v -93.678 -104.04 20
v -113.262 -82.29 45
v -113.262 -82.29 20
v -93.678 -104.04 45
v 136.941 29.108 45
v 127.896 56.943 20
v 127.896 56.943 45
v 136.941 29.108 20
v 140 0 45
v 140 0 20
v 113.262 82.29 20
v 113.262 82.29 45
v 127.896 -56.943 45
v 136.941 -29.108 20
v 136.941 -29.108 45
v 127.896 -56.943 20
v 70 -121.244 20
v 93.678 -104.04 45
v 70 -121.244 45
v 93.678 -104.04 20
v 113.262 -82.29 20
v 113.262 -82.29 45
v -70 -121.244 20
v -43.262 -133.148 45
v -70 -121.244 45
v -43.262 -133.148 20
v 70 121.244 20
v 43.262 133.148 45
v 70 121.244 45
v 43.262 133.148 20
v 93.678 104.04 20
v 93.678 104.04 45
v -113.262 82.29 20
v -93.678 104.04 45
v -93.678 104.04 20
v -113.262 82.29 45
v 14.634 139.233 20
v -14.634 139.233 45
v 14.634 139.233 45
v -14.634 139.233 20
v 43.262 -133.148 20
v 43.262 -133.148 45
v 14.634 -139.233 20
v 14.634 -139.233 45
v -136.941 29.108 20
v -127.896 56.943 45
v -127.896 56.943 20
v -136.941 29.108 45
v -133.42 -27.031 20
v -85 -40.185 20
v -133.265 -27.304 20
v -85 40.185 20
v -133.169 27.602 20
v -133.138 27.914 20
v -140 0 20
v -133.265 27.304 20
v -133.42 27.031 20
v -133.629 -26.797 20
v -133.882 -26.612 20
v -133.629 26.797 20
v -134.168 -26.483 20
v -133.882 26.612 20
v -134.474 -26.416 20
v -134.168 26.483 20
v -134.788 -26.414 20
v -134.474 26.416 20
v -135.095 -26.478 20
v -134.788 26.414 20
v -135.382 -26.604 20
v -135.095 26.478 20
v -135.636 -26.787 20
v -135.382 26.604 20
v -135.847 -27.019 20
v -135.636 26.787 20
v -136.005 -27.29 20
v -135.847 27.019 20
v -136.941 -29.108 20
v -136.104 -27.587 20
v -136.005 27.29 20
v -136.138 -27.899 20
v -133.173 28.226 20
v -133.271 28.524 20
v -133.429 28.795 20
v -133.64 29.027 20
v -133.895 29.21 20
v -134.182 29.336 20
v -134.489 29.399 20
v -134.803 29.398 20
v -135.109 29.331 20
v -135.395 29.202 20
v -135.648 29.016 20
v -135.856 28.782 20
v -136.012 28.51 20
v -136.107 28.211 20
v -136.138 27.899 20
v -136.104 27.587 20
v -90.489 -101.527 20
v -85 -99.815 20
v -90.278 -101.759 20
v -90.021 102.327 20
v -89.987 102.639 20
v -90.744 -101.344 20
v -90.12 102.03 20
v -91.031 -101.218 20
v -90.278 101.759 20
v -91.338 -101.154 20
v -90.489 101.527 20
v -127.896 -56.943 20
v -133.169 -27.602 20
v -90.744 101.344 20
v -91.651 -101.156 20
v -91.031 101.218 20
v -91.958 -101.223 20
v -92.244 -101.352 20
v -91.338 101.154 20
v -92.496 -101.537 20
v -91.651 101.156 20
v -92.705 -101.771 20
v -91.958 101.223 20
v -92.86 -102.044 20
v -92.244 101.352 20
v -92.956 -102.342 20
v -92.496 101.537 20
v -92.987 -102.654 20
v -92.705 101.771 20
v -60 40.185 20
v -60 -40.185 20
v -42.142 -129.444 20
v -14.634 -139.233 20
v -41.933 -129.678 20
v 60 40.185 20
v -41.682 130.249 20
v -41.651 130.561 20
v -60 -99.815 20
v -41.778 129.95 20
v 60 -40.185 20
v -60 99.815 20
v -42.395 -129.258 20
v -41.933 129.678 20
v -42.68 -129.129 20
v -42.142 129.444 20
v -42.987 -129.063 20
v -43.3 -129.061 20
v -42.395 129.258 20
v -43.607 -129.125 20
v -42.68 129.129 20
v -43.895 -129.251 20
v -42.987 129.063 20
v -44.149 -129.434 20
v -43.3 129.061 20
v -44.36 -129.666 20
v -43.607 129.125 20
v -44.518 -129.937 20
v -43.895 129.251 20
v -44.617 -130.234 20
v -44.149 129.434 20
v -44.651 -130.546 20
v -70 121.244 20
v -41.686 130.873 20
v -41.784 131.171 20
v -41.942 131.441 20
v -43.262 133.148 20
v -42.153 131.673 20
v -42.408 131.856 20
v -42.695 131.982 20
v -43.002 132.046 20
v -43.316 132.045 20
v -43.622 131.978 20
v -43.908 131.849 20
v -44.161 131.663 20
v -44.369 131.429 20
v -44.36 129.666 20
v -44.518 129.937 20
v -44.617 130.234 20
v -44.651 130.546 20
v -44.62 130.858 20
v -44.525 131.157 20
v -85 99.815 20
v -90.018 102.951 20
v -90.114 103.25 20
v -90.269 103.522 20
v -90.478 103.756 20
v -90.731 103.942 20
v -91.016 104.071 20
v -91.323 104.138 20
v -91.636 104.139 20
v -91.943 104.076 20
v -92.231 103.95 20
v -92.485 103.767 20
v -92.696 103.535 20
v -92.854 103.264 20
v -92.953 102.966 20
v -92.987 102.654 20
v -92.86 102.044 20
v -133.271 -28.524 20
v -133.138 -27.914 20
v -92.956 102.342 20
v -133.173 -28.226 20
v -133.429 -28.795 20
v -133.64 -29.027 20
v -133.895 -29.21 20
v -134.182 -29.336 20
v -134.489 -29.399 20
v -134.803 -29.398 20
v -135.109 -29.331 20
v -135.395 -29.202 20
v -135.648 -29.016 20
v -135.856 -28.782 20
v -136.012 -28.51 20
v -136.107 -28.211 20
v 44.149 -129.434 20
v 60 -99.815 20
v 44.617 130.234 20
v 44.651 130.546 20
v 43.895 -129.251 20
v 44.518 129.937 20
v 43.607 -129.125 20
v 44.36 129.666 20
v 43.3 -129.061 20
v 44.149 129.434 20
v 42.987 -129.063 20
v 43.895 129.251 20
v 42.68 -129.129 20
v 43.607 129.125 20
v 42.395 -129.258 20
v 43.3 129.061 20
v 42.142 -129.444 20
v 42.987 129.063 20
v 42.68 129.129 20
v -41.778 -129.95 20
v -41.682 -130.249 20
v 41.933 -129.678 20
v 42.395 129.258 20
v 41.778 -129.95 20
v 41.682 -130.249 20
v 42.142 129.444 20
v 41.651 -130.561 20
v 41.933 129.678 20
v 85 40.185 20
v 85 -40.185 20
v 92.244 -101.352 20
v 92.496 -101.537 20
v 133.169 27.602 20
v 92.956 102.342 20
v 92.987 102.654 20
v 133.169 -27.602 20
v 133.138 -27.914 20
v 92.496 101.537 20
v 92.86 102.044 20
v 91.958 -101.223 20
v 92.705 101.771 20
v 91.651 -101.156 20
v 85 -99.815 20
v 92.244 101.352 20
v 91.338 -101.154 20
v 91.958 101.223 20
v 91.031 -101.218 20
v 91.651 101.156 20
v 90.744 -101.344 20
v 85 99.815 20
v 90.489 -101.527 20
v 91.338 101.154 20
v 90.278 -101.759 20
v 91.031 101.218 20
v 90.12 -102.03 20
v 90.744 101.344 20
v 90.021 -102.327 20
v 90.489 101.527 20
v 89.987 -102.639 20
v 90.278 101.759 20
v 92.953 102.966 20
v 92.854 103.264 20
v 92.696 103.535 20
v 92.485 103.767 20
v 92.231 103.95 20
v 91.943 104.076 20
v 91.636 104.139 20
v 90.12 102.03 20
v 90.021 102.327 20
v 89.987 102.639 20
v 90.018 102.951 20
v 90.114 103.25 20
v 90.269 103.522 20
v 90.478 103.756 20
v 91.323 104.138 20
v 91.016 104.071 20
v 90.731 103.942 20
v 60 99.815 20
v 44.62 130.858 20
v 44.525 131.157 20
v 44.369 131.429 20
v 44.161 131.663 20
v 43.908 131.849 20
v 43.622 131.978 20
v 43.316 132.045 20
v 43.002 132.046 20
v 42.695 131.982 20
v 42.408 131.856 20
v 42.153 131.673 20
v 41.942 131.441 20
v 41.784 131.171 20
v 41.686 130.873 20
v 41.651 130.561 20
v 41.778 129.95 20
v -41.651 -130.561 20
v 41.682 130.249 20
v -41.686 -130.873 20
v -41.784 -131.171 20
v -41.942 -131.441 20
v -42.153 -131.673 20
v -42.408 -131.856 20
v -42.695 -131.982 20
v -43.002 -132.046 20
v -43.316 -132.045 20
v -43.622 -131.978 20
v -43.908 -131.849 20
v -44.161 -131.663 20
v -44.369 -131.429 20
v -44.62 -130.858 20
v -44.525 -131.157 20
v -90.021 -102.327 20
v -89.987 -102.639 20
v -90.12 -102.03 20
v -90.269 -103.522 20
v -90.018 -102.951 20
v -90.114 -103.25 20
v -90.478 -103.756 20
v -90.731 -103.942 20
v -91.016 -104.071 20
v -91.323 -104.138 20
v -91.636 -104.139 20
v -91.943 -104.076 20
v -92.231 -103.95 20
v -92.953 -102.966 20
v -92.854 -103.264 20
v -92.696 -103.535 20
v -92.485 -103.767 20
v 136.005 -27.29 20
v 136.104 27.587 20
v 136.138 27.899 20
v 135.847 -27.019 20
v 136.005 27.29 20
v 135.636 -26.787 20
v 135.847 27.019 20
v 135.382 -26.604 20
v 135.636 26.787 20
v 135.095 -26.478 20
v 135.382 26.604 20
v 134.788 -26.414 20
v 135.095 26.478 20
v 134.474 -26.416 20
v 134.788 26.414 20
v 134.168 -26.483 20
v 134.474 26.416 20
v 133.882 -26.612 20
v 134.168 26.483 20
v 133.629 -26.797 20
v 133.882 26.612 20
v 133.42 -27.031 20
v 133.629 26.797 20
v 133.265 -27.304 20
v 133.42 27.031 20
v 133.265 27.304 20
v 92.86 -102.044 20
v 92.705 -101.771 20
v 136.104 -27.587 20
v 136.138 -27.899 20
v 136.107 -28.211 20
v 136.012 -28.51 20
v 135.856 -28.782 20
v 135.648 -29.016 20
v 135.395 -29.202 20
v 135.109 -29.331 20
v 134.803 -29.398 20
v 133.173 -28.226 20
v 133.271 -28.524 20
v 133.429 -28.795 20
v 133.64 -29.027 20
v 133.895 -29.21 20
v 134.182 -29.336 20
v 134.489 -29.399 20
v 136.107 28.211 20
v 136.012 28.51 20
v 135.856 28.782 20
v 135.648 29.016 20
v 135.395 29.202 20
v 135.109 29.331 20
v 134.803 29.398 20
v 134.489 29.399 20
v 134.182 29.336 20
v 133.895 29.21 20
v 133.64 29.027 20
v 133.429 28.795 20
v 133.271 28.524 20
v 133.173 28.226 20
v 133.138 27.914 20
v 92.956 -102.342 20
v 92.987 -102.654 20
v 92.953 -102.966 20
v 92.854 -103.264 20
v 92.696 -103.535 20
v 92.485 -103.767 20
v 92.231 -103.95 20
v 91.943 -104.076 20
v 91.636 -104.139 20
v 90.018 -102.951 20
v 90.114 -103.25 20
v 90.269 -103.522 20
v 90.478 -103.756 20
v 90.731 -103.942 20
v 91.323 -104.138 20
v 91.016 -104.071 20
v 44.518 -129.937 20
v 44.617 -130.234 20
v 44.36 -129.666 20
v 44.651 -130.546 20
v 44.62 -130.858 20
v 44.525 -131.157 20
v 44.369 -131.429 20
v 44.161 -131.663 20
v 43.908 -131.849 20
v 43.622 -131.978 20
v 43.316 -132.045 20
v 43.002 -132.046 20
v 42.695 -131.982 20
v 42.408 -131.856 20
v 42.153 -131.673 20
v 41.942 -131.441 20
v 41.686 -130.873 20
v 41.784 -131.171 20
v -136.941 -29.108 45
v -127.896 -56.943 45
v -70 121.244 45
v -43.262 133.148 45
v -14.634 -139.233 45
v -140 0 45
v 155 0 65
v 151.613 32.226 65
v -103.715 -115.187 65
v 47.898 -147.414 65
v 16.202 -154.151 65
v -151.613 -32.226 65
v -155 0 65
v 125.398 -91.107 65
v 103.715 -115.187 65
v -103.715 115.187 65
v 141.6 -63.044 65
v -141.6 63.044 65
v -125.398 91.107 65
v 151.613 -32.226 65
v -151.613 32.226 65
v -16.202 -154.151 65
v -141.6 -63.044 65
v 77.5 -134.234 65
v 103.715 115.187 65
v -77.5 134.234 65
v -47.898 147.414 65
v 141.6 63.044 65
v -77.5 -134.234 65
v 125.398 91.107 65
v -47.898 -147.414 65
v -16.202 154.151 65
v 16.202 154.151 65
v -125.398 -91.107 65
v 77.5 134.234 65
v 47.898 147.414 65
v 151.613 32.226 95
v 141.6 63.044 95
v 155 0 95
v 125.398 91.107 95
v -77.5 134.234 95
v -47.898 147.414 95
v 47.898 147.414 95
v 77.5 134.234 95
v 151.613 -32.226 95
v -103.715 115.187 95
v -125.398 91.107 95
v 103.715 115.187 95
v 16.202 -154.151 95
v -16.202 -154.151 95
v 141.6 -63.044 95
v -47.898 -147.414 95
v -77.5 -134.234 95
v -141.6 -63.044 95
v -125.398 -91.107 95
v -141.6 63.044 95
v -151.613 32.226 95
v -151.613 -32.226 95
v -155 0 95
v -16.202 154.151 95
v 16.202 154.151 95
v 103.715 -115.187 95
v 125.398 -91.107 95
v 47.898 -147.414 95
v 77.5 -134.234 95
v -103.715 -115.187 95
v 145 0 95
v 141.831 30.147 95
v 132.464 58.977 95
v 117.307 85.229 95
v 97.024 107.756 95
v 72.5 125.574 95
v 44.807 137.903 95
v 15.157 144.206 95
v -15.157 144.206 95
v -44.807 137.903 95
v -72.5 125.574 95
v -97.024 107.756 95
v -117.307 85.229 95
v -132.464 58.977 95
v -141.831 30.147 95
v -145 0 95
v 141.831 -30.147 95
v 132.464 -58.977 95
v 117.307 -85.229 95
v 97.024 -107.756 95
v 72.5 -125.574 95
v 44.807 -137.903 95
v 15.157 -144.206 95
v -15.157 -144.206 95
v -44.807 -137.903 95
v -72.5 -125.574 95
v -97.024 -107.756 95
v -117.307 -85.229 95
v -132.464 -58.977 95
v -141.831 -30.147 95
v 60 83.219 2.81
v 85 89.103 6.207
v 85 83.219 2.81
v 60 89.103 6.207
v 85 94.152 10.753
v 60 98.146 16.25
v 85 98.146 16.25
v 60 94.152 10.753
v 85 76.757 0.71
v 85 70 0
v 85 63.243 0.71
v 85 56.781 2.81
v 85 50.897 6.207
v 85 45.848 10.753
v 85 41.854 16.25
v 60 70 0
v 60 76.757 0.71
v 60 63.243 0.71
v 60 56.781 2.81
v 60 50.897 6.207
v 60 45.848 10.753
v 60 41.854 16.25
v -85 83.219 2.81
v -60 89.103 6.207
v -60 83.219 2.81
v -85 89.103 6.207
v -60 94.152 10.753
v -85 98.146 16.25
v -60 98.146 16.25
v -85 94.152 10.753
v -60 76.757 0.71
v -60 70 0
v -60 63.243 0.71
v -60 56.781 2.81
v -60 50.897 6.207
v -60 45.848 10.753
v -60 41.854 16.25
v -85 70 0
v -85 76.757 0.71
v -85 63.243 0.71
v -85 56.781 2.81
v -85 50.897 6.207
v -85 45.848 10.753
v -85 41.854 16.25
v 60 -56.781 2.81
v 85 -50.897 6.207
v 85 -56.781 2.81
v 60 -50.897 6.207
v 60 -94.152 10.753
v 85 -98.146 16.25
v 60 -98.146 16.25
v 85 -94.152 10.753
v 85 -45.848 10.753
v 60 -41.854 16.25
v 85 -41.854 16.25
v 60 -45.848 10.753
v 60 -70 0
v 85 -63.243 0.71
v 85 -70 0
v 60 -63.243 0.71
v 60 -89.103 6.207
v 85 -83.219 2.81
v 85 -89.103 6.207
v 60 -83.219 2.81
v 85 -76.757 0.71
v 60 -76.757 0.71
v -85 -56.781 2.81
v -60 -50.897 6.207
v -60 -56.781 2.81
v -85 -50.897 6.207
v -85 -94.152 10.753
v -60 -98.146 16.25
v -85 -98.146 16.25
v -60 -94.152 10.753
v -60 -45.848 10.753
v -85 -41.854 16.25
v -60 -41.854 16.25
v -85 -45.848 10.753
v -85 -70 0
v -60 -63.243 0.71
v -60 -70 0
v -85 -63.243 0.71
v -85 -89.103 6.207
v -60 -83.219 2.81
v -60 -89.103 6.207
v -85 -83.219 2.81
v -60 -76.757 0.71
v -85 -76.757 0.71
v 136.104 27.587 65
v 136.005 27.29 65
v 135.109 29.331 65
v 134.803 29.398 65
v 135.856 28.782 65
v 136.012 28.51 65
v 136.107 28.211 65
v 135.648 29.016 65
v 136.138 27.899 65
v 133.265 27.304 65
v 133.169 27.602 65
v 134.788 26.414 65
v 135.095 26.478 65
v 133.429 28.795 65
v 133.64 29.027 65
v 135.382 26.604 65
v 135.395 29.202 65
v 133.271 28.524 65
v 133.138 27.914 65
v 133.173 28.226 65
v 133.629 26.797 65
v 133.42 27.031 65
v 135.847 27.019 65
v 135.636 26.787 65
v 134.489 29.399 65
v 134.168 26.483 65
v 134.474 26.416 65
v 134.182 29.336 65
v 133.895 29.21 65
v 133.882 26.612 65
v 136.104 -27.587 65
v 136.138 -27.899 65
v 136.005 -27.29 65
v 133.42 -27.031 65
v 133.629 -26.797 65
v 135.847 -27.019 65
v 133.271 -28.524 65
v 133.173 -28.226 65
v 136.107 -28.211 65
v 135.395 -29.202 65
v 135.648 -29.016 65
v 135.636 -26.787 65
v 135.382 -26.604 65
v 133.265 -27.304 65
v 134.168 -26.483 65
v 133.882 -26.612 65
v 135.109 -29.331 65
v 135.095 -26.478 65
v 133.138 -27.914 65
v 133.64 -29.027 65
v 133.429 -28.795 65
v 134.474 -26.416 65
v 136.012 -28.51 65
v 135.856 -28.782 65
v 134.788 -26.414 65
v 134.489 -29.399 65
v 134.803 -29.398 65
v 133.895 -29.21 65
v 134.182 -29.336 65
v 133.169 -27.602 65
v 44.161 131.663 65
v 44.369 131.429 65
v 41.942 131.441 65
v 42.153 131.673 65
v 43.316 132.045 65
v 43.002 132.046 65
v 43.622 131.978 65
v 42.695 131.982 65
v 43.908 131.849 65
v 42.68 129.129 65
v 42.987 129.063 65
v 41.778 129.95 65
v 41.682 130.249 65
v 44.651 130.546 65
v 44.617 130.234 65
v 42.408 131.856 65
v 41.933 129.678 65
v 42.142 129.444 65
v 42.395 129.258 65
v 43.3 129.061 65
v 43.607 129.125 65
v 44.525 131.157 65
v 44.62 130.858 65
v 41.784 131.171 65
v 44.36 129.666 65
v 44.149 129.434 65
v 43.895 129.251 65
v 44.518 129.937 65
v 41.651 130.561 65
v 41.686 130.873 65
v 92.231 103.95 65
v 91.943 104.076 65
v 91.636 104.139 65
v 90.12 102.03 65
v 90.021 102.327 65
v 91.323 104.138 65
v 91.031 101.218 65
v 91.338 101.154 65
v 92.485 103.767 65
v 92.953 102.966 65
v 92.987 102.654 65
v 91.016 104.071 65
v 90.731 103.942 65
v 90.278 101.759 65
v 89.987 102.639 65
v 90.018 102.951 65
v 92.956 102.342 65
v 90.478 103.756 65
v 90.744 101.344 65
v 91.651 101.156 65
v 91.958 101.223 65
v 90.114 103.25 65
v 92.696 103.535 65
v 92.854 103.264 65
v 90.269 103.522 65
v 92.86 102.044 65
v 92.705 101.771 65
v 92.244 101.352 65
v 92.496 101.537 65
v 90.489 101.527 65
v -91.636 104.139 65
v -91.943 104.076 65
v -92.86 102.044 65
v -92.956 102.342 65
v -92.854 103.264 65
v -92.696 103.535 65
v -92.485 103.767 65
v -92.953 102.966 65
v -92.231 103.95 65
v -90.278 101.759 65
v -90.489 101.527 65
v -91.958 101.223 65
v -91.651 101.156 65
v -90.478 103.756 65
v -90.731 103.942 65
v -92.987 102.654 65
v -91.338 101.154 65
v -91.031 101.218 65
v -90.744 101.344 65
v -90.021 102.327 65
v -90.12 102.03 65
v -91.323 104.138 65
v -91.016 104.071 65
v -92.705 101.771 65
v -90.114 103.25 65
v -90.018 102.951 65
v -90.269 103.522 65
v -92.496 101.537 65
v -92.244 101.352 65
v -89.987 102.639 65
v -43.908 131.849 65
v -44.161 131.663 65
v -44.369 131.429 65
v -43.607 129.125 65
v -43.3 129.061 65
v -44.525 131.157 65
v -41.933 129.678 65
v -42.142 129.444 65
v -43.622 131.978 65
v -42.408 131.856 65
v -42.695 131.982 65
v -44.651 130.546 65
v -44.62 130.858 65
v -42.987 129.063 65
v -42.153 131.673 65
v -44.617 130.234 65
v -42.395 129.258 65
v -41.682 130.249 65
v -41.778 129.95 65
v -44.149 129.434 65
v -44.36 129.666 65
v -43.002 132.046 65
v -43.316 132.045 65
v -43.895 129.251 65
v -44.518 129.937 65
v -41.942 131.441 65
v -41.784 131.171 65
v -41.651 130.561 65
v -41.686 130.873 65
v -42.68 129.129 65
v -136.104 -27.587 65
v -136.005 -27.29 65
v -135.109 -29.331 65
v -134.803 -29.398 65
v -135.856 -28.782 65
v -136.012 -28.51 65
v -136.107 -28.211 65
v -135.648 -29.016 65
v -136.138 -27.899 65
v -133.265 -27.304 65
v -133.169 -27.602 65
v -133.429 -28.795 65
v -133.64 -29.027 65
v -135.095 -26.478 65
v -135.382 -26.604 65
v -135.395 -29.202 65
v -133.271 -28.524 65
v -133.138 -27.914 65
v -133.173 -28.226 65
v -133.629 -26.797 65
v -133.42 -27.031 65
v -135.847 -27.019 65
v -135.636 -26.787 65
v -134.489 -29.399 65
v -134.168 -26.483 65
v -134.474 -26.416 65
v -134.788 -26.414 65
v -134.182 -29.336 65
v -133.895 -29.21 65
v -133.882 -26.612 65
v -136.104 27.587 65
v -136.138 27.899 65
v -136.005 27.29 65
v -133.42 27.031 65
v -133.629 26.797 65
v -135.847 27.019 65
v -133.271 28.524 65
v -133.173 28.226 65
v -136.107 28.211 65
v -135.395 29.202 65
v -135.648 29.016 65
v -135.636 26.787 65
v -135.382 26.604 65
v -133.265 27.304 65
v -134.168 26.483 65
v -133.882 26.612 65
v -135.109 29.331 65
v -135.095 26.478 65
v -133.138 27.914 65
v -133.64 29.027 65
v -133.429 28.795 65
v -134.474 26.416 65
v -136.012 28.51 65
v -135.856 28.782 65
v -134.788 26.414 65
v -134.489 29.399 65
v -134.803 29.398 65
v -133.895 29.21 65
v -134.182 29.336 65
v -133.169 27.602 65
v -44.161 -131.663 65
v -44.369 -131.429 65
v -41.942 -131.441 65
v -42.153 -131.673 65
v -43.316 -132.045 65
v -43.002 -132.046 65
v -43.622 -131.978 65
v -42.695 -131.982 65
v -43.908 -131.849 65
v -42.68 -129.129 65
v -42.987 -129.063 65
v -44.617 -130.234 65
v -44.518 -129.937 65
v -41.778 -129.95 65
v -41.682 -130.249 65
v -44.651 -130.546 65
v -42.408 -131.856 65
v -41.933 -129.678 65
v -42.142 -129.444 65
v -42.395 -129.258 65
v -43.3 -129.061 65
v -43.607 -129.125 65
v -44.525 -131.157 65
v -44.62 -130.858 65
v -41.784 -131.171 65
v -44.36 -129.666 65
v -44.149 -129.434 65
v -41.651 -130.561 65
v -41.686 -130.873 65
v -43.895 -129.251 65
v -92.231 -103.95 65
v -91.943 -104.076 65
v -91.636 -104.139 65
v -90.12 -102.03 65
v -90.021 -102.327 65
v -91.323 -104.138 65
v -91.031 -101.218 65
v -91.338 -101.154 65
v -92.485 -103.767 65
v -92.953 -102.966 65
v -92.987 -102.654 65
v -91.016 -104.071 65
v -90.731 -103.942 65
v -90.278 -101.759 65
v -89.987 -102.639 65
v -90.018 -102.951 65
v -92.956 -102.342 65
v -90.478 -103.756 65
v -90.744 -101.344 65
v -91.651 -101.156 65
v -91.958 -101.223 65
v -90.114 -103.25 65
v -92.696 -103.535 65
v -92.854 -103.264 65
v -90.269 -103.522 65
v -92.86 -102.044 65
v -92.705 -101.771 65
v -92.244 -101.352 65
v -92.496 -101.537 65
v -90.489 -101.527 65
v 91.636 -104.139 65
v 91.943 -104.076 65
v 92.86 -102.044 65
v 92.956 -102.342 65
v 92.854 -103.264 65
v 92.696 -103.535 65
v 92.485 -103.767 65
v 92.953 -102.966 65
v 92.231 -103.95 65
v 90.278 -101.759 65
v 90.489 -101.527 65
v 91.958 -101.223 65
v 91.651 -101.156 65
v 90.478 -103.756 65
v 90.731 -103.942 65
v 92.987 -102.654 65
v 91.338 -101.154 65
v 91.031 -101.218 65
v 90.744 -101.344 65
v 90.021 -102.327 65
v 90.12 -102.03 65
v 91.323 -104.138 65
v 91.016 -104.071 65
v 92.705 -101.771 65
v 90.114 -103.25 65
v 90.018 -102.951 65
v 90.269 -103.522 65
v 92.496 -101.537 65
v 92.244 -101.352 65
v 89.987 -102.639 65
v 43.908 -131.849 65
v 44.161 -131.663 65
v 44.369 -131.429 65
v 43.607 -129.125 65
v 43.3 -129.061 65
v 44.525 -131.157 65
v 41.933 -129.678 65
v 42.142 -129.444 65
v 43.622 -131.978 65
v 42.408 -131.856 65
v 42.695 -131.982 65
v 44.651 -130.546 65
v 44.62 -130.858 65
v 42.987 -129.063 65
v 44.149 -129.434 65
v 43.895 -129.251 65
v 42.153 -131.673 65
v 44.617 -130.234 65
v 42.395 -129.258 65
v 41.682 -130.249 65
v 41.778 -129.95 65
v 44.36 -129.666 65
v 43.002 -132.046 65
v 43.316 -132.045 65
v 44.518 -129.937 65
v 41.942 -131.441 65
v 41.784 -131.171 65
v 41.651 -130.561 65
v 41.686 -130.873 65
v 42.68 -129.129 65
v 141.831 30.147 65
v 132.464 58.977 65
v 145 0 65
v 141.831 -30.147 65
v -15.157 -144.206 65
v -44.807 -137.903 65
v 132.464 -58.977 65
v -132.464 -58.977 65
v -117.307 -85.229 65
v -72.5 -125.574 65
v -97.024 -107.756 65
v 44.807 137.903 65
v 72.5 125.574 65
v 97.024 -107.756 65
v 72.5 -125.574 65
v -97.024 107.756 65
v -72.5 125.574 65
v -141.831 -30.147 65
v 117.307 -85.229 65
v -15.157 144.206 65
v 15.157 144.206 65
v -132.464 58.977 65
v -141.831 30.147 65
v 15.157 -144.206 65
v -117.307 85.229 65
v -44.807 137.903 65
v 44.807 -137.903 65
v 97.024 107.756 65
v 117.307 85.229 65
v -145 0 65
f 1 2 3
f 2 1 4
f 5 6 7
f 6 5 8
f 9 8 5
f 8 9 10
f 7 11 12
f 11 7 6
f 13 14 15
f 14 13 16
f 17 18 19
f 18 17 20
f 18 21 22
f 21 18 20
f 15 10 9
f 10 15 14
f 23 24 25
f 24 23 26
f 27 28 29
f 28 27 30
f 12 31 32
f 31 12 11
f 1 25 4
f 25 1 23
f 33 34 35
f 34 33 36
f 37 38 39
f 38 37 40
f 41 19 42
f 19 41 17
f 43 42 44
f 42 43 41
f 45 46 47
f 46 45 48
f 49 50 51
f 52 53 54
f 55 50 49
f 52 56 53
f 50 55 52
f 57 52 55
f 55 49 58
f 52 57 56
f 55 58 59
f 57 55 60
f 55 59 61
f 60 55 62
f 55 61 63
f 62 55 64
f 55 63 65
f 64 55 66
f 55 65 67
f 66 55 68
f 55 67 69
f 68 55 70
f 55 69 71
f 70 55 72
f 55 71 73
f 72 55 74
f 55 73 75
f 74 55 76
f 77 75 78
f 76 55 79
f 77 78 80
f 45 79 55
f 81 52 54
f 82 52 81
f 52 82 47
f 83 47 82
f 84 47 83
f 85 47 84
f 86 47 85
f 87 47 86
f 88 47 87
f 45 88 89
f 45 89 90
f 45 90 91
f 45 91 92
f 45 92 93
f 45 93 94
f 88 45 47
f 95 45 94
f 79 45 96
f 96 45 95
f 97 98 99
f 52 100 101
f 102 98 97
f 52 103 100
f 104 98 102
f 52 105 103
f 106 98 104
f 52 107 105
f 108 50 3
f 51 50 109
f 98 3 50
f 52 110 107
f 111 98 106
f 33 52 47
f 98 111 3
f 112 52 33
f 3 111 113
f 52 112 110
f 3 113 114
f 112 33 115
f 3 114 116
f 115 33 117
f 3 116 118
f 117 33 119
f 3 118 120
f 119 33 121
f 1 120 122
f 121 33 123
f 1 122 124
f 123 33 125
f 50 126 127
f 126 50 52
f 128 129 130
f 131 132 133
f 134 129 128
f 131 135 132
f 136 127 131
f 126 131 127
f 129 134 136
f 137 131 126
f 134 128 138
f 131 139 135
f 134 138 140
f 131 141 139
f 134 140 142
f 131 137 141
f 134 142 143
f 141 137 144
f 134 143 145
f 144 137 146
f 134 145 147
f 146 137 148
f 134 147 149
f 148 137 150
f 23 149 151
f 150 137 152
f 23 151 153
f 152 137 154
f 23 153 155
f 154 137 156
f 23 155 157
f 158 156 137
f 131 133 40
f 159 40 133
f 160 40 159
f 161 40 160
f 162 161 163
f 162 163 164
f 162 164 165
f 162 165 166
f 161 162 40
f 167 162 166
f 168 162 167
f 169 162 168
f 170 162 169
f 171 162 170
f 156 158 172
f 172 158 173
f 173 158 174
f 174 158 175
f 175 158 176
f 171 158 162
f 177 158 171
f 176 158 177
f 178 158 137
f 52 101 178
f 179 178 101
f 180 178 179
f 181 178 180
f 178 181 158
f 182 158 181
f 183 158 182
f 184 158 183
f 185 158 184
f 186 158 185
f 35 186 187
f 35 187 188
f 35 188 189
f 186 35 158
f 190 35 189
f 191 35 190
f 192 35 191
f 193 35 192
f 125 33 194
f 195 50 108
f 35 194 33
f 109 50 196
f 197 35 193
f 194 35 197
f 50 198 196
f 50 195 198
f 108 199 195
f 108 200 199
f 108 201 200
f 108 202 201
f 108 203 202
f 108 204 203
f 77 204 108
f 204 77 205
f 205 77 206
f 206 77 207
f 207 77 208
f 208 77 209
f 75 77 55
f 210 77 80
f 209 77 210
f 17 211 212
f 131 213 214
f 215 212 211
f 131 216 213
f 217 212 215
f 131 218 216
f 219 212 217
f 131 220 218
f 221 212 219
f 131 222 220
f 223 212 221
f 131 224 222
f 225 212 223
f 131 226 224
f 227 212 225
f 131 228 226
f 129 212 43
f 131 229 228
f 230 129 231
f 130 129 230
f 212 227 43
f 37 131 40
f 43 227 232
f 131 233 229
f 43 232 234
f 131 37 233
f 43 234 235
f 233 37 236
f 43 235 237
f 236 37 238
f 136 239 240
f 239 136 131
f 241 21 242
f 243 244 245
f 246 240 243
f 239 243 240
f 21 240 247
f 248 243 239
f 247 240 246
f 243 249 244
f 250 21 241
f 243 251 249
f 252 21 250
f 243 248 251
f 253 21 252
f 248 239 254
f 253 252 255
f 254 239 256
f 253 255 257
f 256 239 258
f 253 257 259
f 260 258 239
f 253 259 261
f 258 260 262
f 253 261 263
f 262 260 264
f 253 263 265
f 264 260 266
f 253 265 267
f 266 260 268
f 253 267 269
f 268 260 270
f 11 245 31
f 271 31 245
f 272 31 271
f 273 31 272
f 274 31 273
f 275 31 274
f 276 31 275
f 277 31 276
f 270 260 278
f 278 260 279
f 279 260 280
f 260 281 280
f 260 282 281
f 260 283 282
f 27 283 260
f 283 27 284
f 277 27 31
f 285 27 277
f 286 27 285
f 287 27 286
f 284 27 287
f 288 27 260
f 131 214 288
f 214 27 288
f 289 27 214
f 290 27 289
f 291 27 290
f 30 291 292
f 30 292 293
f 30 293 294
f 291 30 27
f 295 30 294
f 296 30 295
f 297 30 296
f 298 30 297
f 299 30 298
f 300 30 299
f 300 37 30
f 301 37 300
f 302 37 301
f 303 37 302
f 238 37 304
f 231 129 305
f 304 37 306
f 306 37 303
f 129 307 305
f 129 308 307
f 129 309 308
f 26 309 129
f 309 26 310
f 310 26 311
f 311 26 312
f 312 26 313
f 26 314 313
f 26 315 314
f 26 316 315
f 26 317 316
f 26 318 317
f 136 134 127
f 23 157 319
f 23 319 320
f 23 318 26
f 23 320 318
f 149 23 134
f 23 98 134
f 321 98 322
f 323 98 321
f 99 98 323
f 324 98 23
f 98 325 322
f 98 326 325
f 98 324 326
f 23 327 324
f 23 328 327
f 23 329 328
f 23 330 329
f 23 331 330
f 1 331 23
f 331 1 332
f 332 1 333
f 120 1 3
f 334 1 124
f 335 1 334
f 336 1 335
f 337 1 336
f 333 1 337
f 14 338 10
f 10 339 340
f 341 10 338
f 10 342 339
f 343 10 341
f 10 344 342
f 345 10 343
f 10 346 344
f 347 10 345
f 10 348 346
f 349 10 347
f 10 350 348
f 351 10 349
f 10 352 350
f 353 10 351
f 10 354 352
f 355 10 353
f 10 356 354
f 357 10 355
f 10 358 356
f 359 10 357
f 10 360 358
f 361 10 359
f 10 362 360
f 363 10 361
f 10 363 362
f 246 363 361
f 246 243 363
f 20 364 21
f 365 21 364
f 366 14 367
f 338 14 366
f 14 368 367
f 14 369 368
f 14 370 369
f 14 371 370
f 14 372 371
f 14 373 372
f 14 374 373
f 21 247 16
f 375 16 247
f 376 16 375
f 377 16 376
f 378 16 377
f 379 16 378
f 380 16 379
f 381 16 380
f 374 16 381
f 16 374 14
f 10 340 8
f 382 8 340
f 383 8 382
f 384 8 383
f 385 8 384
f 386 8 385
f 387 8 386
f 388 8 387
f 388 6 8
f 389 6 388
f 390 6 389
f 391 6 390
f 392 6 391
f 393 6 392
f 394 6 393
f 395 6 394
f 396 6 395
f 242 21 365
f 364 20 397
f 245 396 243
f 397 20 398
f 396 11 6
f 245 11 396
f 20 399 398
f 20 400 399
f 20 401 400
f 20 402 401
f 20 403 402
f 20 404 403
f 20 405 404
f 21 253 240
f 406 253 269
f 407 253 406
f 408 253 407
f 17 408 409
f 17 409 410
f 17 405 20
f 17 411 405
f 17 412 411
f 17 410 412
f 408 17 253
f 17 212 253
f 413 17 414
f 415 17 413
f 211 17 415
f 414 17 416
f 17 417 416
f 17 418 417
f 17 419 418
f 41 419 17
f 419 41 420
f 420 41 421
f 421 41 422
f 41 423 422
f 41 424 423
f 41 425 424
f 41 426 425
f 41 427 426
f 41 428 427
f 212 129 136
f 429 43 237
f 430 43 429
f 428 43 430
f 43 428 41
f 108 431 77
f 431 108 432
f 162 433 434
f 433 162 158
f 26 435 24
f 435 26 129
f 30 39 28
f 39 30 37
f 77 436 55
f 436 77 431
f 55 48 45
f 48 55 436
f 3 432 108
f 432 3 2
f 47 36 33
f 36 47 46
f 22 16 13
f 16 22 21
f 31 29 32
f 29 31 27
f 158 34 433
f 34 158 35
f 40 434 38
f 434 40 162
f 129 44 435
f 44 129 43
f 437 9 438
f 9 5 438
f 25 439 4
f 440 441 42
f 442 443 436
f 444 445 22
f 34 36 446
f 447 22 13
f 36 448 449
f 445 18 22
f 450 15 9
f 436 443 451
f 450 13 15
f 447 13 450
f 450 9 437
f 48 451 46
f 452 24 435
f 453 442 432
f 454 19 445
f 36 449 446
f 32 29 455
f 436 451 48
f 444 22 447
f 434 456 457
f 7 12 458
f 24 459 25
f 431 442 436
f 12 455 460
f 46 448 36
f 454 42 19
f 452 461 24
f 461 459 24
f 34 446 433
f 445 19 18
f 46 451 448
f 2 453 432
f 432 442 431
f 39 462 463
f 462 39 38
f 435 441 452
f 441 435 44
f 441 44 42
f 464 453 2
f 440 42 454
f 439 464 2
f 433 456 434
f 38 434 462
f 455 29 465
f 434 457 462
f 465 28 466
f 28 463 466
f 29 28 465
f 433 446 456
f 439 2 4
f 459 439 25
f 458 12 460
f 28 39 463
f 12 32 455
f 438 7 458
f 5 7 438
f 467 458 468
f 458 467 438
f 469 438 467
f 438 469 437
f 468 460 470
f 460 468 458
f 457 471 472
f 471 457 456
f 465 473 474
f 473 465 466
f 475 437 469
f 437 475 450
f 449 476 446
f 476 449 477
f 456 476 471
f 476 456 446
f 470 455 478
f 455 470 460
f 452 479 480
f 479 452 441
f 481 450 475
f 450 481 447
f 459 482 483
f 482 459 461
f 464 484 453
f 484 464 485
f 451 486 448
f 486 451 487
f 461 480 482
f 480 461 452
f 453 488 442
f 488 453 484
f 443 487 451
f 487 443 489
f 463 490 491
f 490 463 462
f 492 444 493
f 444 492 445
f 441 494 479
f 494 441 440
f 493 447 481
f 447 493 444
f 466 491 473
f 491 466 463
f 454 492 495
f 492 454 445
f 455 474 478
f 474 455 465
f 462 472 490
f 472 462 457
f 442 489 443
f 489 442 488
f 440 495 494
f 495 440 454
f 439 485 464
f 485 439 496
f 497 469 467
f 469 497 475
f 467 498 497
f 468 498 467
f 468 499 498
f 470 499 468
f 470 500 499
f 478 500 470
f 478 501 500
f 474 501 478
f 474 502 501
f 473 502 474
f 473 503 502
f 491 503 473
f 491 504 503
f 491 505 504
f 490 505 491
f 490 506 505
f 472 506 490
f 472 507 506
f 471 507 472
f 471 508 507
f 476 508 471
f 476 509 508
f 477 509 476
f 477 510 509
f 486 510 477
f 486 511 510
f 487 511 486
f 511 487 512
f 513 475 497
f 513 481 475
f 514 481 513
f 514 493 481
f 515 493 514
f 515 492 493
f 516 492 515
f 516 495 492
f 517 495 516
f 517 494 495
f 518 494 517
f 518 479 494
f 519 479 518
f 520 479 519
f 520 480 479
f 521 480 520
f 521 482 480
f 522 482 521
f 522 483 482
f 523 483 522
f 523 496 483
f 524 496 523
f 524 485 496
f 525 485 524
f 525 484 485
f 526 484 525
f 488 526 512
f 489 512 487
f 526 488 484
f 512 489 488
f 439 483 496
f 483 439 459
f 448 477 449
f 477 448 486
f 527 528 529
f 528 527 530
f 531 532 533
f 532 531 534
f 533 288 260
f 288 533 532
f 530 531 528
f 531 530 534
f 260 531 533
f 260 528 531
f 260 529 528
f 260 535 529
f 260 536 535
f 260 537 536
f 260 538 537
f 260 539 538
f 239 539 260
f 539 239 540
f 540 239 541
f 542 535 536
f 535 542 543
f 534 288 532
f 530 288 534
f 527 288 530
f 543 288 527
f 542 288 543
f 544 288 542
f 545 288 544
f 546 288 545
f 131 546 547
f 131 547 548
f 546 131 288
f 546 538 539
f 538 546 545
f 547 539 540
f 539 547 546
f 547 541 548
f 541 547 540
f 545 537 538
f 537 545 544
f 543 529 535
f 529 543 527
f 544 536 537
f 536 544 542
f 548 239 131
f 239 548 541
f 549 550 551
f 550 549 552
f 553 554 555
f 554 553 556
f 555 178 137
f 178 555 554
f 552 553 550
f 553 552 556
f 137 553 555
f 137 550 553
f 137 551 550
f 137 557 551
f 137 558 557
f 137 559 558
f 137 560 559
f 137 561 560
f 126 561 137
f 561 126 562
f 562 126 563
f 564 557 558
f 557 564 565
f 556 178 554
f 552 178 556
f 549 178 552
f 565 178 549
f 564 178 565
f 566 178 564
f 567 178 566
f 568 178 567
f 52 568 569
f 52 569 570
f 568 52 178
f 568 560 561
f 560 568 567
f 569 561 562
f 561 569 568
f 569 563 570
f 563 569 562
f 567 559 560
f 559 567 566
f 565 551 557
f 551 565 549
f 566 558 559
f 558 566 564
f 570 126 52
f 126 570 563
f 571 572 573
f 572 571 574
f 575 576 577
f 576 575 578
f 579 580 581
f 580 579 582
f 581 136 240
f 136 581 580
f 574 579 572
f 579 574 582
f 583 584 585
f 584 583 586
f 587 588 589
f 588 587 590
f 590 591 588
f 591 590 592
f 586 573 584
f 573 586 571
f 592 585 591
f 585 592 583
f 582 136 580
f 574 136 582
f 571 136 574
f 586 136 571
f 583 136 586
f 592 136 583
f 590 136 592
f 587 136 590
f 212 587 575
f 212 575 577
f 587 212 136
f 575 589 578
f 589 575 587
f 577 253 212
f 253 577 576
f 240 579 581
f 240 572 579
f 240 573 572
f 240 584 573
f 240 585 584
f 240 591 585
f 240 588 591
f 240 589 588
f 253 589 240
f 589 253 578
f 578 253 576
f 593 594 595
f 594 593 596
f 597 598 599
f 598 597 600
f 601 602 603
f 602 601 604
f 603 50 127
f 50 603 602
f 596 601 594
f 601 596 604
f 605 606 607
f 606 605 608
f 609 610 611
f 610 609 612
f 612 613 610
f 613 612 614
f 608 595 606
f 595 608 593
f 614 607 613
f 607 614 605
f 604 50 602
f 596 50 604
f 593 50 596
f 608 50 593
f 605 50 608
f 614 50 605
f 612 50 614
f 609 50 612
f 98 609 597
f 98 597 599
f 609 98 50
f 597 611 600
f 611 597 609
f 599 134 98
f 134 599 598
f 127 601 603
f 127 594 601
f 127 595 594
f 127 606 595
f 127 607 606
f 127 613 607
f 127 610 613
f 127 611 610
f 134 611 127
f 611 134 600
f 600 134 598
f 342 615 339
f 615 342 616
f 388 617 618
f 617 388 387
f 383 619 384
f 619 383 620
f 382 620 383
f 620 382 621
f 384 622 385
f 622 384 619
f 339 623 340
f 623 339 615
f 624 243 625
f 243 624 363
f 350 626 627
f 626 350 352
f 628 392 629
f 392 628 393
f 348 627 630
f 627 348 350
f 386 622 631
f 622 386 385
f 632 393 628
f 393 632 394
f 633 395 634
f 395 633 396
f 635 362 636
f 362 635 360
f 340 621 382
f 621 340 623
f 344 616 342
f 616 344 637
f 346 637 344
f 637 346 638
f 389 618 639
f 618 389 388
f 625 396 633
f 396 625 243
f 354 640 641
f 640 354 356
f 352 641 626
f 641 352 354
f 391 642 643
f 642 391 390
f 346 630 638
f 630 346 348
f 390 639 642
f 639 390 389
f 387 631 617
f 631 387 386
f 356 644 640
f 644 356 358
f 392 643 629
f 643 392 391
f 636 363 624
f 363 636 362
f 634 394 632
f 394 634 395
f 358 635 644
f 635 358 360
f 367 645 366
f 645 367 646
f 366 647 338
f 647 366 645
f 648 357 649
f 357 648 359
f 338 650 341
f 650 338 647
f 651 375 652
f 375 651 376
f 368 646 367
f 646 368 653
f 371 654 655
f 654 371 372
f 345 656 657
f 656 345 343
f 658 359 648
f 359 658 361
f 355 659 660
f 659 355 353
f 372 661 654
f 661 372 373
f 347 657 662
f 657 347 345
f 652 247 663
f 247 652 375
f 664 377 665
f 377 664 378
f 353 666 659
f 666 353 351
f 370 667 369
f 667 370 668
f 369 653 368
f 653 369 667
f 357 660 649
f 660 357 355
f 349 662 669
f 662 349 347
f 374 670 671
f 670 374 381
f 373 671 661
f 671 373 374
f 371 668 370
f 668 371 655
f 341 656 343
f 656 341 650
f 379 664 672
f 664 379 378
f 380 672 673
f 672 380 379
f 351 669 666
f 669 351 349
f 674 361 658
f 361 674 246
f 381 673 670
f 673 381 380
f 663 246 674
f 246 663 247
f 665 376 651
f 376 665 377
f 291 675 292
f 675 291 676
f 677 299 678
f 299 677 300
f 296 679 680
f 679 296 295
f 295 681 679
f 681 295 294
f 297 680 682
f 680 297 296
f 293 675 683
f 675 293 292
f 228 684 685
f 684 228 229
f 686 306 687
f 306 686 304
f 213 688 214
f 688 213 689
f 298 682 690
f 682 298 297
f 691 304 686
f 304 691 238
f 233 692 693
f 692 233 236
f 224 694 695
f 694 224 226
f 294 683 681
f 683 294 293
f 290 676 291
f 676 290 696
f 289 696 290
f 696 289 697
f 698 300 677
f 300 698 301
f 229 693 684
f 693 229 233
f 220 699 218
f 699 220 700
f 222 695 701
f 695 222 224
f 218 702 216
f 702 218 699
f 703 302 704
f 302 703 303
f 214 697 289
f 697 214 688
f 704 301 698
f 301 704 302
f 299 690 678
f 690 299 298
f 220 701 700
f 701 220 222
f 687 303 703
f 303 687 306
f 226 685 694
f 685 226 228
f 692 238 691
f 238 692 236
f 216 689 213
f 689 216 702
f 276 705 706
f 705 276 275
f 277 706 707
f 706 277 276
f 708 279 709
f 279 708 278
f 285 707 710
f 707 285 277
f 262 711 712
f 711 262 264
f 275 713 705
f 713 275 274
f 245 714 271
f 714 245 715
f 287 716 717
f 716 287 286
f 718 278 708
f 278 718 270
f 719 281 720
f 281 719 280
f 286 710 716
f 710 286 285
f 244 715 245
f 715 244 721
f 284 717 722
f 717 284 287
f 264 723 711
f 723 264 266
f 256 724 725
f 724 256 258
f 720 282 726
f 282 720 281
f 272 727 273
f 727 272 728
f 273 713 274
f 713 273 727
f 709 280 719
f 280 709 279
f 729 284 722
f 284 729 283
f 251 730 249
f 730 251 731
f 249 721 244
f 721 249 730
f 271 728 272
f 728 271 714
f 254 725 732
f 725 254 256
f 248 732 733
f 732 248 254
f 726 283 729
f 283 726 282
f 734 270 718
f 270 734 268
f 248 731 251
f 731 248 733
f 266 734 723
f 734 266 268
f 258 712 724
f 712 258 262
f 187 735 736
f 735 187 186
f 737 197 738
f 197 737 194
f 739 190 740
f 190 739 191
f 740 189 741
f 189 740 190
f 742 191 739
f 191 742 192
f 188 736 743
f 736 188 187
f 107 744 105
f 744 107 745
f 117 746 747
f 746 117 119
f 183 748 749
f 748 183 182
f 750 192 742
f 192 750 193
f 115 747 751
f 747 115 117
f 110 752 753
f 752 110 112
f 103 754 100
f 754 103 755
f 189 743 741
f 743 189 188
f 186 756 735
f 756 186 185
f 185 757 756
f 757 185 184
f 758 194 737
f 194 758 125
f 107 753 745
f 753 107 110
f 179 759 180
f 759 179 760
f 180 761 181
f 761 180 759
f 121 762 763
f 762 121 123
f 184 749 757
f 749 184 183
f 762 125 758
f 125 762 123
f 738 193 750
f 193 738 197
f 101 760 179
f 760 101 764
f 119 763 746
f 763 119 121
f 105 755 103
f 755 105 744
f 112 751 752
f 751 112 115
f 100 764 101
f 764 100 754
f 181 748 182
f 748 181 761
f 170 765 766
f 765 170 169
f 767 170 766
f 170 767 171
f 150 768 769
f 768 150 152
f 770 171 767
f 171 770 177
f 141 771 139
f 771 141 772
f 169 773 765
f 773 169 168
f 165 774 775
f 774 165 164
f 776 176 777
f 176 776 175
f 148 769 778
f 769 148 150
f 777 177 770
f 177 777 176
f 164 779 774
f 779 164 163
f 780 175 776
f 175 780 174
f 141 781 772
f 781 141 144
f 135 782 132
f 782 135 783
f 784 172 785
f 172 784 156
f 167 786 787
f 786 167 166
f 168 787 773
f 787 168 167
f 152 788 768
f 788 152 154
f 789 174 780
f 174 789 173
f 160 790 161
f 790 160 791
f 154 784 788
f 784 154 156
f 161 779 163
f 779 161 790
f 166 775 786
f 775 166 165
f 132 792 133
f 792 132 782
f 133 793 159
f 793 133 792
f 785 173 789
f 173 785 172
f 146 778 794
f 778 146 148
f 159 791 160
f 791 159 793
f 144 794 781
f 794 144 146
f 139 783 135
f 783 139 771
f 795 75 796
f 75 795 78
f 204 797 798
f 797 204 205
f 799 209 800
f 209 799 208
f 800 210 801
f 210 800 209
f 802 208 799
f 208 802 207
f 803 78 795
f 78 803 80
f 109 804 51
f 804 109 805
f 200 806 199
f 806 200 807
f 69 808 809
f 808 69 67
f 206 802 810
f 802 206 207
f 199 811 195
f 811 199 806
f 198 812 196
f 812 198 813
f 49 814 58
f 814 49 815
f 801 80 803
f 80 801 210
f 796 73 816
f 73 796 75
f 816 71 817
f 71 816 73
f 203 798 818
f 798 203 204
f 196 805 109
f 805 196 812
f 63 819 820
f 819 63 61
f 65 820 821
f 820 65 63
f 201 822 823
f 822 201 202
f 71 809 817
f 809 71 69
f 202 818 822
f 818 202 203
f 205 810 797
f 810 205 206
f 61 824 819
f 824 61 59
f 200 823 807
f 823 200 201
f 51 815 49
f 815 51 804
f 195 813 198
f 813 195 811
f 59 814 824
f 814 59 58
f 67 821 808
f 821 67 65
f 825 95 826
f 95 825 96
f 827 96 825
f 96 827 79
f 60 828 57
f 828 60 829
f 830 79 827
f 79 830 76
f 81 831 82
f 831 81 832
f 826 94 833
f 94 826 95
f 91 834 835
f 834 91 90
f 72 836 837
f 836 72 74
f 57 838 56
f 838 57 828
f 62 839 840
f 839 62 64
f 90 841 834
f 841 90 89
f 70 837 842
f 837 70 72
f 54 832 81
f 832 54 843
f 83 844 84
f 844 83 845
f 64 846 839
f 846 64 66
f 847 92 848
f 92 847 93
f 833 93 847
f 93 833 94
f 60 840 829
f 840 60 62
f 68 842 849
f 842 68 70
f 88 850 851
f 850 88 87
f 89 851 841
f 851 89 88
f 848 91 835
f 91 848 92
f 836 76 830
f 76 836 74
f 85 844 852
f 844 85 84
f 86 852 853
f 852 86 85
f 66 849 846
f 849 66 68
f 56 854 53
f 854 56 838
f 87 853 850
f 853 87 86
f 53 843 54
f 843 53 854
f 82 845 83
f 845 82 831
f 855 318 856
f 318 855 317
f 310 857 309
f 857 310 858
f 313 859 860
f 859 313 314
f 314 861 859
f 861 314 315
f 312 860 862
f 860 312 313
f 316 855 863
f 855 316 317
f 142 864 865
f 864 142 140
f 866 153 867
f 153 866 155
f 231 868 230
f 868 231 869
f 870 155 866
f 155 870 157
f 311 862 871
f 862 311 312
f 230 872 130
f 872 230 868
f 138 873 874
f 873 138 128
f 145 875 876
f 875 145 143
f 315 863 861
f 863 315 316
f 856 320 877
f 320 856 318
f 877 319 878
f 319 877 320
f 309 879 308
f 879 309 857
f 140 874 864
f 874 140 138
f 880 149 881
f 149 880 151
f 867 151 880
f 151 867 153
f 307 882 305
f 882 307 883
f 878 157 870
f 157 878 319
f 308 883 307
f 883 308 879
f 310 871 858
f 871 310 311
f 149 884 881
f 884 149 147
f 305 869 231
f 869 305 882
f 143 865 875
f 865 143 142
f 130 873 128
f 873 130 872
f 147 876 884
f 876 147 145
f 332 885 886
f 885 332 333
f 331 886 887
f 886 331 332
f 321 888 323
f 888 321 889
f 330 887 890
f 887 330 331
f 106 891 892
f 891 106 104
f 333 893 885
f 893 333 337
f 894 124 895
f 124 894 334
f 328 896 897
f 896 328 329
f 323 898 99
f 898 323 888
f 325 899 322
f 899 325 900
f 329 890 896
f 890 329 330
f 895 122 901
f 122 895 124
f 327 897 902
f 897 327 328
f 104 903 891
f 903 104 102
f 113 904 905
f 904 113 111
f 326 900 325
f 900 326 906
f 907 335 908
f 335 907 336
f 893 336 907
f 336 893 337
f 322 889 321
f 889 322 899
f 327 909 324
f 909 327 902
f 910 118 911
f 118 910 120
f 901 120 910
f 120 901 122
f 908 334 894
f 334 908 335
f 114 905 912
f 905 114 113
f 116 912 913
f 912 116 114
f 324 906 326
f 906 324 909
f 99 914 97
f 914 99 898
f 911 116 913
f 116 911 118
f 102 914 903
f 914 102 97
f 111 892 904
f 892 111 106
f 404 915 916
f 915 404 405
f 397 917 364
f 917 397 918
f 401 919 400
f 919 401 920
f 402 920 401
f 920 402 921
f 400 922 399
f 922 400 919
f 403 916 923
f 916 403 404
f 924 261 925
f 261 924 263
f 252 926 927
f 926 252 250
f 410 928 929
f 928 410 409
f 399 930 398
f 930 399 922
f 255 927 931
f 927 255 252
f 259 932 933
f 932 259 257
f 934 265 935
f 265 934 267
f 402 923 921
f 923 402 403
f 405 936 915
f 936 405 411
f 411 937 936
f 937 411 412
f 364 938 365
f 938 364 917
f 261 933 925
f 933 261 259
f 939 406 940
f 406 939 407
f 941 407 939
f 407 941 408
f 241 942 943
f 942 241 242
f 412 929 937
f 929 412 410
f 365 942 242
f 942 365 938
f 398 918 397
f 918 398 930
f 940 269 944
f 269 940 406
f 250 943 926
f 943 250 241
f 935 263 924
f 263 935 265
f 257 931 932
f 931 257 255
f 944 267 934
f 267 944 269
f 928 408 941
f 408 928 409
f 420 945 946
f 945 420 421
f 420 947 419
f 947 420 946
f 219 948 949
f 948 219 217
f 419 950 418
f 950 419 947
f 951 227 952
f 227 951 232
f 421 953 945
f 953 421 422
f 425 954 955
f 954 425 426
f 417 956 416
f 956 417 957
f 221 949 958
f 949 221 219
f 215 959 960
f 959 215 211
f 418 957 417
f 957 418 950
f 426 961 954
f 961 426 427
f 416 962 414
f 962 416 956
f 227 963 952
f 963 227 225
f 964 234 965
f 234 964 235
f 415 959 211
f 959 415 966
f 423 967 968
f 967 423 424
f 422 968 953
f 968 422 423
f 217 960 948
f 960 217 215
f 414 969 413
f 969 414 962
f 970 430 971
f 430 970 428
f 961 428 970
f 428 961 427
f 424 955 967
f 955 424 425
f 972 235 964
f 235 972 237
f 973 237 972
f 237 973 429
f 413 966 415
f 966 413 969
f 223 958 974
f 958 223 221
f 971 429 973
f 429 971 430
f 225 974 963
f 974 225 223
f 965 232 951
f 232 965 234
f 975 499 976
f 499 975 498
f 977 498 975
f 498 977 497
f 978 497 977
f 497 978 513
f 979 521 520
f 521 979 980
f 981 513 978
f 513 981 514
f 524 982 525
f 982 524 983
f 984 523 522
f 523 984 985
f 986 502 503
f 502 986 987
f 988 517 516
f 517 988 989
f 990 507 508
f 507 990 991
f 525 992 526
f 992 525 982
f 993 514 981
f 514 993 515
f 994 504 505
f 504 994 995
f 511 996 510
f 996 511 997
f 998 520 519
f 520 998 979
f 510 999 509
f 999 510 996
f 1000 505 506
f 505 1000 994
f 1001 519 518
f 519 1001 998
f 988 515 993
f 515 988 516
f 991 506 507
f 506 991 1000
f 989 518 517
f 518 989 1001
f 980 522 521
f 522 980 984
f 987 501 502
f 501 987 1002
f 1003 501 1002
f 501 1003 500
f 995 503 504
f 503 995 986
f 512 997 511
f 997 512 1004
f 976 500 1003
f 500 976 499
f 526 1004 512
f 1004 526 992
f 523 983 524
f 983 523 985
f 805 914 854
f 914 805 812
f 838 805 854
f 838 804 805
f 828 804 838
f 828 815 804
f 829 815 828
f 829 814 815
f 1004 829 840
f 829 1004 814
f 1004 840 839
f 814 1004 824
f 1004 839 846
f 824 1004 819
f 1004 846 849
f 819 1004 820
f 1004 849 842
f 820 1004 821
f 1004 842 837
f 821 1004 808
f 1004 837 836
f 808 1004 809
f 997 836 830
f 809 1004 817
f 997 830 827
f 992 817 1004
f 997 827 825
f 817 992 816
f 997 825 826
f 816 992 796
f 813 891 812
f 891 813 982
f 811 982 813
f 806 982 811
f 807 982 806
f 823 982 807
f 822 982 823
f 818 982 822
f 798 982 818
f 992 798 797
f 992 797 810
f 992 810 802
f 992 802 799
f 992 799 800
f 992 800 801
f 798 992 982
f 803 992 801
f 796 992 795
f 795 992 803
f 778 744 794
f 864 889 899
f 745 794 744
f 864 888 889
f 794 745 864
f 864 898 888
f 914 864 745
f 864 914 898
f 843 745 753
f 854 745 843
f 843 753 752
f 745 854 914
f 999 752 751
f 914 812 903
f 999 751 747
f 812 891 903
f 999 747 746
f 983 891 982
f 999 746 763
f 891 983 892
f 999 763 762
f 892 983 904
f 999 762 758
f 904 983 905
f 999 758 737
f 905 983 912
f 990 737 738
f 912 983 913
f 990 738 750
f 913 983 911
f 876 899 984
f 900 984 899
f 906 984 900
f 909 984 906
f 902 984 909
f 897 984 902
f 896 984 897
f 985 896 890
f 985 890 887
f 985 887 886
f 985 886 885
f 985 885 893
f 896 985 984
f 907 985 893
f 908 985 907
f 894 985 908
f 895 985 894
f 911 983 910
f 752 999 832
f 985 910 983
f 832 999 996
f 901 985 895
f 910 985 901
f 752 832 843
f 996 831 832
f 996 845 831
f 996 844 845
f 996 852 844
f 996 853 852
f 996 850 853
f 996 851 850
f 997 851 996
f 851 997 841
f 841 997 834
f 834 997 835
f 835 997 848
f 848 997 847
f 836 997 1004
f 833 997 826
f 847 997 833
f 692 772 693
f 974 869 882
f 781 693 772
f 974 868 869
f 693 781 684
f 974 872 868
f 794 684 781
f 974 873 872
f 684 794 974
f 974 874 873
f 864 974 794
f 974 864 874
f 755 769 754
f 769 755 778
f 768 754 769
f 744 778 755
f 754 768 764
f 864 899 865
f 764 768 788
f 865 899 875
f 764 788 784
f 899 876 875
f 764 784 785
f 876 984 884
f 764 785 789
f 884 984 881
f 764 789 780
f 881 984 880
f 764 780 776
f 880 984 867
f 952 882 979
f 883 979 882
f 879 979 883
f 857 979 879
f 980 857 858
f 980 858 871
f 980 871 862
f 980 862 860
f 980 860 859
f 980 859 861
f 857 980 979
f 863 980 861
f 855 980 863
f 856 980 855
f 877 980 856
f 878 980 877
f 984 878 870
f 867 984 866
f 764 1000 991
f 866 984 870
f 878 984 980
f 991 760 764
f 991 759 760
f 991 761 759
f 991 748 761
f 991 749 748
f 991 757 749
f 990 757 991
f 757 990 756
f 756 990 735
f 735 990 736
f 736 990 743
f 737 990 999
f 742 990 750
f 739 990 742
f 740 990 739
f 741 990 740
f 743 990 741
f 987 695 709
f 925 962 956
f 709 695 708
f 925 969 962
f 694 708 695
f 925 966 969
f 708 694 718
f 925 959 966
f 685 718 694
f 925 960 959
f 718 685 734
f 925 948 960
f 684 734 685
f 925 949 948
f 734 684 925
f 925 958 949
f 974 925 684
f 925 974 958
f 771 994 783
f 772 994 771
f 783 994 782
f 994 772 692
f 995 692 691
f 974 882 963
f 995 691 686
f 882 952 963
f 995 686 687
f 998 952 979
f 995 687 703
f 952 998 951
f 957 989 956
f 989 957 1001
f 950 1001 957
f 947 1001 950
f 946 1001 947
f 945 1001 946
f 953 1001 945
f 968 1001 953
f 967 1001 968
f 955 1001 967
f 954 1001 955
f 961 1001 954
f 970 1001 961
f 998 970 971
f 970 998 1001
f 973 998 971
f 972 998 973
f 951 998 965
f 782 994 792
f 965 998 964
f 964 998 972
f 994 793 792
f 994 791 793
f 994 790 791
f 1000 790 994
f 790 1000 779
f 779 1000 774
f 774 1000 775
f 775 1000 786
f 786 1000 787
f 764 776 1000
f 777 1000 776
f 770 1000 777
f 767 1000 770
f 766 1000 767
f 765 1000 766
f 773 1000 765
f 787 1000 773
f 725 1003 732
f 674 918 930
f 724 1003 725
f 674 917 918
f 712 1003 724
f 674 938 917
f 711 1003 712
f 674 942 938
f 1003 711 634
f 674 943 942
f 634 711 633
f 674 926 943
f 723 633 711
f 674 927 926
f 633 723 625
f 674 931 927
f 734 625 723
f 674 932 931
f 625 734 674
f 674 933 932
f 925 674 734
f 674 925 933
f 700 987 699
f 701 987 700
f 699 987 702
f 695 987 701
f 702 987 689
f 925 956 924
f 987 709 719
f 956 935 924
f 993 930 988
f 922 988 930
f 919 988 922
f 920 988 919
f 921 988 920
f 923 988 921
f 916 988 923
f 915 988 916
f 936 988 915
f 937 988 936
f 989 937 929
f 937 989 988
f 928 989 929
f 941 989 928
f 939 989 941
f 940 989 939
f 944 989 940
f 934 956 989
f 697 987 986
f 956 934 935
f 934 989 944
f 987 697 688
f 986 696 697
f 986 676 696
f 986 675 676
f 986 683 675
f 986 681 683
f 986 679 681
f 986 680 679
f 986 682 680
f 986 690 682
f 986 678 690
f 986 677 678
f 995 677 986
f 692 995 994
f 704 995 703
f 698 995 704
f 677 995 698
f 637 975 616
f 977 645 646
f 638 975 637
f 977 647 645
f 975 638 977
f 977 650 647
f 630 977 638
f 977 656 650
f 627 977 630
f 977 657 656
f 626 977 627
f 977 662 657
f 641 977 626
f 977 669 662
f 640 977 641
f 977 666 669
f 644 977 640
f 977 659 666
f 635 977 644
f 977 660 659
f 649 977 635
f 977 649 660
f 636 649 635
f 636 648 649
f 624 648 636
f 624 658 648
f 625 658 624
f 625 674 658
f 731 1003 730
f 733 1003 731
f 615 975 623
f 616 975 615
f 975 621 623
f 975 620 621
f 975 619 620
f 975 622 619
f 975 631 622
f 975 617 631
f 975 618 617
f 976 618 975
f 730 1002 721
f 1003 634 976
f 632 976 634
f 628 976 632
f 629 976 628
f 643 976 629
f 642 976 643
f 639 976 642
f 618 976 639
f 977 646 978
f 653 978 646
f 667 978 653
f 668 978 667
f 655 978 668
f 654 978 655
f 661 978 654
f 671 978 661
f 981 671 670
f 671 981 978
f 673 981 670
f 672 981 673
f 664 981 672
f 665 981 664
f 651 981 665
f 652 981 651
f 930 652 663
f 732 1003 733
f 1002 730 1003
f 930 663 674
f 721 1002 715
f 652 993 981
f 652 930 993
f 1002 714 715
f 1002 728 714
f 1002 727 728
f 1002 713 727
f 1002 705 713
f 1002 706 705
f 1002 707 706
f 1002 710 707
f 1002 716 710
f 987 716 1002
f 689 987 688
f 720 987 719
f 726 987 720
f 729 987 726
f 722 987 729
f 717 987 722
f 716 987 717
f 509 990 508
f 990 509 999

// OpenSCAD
module top() {
difference() {
union() {
cylinder(d=310,h=32);
translate([0,0,32])cylinder(d1=310,d2=280,h=20);
translate([0,0,52])cylinder(d=280,h=20);
}
cylinder(d=235,h=75);
translate([0,0,20])cylinder(d1=304,d2=280,h=20);
translate([0,0,-1])cylinder(d=304,h=21);
}
}

module base() {

difference() {
union() {
translate([0,0,20])cylinder(d=280,h=25);
translate([0,0,45])cylinder(d1=280,d2=310,h=20);
translate([0,0,65])cylinder(d=310,h=30);
translate([145/2,140/2,65/2])rotate([0,90,0]) cylinder(d=65,h=25,center=true);
translate([-145/2,140/2,65/2])rotate([0,90,0]) cylinder(d=65,h=25,center=true);
translate([145/2,-140/2,65/2])rotate([0,90,0]) cylinder(d=65,h=25,center=true);
translate([-145/2,-140/2,65/2])rotate([0,90,0]) cylinder(d=65,h=25,center=true);
}
translate([0,0,65])cylinder(d=290,h=45);
for (i = [0:60:300]) {
  rotate(i) {
  rotate(11.7100) translate([275/2,0,0])cylinder(d=3,h=450);
  rotate(-11.7100) translate([275/2,0,0])cylinder(d=3,h=450);
  }
}

//cylinder(d=310,h=98);
//cylinder(d=310,h=98);
}
}

module complete() {
base();
translate([0,0,95]) top();
}
$fn=30;

base();
